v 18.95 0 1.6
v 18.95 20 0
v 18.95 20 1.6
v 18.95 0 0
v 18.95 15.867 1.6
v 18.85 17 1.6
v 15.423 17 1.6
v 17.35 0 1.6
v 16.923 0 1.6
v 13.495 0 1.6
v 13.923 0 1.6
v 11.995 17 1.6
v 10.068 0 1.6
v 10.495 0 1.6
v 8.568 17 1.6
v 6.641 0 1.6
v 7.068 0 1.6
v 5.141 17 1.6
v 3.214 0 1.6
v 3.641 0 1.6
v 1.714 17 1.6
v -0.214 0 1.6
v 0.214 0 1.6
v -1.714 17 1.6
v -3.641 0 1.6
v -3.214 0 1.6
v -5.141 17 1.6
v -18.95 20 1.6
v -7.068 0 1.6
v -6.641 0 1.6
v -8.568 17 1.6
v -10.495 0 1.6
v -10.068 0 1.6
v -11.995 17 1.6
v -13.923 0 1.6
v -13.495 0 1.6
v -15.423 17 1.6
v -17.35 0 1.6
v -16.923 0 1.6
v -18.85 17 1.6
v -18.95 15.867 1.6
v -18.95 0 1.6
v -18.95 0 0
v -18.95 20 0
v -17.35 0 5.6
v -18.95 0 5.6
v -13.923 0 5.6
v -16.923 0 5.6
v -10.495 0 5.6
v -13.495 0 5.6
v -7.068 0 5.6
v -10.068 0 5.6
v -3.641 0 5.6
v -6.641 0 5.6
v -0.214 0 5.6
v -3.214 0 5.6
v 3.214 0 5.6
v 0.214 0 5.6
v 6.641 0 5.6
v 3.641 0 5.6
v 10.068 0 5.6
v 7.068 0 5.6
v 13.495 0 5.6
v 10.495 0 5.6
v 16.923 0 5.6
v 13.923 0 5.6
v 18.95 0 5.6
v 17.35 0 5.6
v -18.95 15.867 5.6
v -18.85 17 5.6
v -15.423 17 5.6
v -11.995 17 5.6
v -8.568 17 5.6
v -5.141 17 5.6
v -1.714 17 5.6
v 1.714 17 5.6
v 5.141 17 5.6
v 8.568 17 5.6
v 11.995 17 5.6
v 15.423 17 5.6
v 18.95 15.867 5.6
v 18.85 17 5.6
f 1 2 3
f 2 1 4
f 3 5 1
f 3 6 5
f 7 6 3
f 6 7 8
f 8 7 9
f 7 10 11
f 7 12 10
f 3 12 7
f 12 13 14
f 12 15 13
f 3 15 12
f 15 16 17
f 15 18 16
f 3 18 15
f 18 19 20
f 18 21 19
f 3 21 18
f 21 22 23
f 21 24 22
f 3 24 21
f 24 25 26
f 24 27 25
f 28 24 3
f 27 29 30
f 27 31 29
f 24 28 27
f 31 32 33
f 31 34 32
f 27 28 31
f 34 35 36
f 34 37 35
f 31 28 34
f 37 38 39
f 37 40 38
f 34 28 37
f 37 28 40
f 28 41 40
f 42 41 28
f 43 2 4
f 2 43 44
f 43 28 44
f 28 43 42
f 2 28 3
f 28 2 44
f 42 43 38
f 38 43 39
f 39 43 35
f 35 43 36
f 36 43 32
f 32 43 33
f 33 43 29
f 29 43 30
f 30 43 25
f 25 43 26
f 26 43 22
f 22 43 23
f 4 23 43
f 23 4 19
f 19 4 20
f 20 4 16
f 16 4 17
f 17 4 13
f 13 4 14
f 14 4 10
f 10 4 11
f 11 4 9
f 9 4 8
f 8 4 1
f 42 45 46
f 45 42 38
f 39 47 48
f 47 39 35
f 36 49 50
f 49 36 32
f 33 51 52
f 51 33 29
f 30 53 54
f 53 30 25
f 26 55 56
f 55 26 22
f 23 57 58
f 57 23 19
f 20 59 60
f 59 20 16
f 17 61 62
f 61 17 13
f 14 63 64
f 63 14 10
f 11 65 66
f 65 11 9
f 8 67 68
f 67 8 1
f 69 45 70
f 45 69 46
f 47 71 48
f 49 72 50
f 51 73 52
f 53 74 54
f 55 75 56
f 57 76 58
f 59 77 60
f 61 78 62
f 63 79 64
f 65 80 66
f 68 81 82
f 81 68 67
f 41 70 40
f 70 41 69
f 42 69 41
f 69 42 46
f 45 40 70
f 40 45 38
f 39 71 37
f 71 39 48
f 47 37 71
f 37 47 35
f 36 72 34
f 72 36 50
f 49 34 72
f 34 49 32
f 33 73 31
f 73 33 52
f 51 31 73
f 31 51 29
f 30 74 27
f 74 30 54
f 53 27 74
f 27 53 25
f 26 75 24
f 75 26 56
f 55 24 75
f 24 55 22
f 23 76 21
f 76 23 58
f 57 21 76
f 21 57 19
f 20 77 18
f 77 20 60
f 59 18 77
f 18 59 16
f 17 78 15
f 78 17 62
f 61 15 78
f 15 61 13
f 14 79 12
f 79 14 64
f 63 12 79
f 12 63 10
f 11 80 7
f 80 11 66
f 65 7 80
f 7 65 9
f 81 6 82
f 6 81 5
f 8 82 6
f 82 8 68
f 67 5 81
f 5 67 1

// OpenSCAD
// SPDX-FileCopyrightText: 2026 Alon A. Rabinowitz
// SPDX-License-Identifier: MPL-2.0

// A mesh fault the slicer repairs without saying so in its summary: a plate with half-teeth standing on it,
// the teeth clipped to the plate's sides - computed two ways that differ in the last bit, the plate from its
// width and the clip from a half-width plus a margin. Clipped exactly there (inset = 0), the Manifold
// backend leaves near-duplicate corners along the sides: 12 broken faces, three bodies by their edges, and
// eight degenerate facets that PrusaSlicer removes before calling the mesh manifold. Moved inside by 0.01 mm
// it is one clean body. Found in a real part's end caps, 7 Oct 2026.
inset = 0;
inner = 37.7;
margin = 0.1;
h = 20;
eps = 0.01;
pitch = inner / 11;
fdm_layer_h = 0.2;
fdm_extrusion_w = 0.45;

w = inner + 2 * margin;
translate([-w / 2, 0, 0]) cube([w, h, 1.6]);
translate([0, 0, 1.6 - eps]) linear_extrude(4 + eps) intersection() {
    translate([-inner / 2 - margin + inset, 0]) square([inner + 2 * (margin - inset), h]);
    for (i = [0 : 11]) let(x = -inner / 2 + i * pitch) polygon([[x - 1.5, 0], [x + 1.5, 0], [x, 17]]);
}
